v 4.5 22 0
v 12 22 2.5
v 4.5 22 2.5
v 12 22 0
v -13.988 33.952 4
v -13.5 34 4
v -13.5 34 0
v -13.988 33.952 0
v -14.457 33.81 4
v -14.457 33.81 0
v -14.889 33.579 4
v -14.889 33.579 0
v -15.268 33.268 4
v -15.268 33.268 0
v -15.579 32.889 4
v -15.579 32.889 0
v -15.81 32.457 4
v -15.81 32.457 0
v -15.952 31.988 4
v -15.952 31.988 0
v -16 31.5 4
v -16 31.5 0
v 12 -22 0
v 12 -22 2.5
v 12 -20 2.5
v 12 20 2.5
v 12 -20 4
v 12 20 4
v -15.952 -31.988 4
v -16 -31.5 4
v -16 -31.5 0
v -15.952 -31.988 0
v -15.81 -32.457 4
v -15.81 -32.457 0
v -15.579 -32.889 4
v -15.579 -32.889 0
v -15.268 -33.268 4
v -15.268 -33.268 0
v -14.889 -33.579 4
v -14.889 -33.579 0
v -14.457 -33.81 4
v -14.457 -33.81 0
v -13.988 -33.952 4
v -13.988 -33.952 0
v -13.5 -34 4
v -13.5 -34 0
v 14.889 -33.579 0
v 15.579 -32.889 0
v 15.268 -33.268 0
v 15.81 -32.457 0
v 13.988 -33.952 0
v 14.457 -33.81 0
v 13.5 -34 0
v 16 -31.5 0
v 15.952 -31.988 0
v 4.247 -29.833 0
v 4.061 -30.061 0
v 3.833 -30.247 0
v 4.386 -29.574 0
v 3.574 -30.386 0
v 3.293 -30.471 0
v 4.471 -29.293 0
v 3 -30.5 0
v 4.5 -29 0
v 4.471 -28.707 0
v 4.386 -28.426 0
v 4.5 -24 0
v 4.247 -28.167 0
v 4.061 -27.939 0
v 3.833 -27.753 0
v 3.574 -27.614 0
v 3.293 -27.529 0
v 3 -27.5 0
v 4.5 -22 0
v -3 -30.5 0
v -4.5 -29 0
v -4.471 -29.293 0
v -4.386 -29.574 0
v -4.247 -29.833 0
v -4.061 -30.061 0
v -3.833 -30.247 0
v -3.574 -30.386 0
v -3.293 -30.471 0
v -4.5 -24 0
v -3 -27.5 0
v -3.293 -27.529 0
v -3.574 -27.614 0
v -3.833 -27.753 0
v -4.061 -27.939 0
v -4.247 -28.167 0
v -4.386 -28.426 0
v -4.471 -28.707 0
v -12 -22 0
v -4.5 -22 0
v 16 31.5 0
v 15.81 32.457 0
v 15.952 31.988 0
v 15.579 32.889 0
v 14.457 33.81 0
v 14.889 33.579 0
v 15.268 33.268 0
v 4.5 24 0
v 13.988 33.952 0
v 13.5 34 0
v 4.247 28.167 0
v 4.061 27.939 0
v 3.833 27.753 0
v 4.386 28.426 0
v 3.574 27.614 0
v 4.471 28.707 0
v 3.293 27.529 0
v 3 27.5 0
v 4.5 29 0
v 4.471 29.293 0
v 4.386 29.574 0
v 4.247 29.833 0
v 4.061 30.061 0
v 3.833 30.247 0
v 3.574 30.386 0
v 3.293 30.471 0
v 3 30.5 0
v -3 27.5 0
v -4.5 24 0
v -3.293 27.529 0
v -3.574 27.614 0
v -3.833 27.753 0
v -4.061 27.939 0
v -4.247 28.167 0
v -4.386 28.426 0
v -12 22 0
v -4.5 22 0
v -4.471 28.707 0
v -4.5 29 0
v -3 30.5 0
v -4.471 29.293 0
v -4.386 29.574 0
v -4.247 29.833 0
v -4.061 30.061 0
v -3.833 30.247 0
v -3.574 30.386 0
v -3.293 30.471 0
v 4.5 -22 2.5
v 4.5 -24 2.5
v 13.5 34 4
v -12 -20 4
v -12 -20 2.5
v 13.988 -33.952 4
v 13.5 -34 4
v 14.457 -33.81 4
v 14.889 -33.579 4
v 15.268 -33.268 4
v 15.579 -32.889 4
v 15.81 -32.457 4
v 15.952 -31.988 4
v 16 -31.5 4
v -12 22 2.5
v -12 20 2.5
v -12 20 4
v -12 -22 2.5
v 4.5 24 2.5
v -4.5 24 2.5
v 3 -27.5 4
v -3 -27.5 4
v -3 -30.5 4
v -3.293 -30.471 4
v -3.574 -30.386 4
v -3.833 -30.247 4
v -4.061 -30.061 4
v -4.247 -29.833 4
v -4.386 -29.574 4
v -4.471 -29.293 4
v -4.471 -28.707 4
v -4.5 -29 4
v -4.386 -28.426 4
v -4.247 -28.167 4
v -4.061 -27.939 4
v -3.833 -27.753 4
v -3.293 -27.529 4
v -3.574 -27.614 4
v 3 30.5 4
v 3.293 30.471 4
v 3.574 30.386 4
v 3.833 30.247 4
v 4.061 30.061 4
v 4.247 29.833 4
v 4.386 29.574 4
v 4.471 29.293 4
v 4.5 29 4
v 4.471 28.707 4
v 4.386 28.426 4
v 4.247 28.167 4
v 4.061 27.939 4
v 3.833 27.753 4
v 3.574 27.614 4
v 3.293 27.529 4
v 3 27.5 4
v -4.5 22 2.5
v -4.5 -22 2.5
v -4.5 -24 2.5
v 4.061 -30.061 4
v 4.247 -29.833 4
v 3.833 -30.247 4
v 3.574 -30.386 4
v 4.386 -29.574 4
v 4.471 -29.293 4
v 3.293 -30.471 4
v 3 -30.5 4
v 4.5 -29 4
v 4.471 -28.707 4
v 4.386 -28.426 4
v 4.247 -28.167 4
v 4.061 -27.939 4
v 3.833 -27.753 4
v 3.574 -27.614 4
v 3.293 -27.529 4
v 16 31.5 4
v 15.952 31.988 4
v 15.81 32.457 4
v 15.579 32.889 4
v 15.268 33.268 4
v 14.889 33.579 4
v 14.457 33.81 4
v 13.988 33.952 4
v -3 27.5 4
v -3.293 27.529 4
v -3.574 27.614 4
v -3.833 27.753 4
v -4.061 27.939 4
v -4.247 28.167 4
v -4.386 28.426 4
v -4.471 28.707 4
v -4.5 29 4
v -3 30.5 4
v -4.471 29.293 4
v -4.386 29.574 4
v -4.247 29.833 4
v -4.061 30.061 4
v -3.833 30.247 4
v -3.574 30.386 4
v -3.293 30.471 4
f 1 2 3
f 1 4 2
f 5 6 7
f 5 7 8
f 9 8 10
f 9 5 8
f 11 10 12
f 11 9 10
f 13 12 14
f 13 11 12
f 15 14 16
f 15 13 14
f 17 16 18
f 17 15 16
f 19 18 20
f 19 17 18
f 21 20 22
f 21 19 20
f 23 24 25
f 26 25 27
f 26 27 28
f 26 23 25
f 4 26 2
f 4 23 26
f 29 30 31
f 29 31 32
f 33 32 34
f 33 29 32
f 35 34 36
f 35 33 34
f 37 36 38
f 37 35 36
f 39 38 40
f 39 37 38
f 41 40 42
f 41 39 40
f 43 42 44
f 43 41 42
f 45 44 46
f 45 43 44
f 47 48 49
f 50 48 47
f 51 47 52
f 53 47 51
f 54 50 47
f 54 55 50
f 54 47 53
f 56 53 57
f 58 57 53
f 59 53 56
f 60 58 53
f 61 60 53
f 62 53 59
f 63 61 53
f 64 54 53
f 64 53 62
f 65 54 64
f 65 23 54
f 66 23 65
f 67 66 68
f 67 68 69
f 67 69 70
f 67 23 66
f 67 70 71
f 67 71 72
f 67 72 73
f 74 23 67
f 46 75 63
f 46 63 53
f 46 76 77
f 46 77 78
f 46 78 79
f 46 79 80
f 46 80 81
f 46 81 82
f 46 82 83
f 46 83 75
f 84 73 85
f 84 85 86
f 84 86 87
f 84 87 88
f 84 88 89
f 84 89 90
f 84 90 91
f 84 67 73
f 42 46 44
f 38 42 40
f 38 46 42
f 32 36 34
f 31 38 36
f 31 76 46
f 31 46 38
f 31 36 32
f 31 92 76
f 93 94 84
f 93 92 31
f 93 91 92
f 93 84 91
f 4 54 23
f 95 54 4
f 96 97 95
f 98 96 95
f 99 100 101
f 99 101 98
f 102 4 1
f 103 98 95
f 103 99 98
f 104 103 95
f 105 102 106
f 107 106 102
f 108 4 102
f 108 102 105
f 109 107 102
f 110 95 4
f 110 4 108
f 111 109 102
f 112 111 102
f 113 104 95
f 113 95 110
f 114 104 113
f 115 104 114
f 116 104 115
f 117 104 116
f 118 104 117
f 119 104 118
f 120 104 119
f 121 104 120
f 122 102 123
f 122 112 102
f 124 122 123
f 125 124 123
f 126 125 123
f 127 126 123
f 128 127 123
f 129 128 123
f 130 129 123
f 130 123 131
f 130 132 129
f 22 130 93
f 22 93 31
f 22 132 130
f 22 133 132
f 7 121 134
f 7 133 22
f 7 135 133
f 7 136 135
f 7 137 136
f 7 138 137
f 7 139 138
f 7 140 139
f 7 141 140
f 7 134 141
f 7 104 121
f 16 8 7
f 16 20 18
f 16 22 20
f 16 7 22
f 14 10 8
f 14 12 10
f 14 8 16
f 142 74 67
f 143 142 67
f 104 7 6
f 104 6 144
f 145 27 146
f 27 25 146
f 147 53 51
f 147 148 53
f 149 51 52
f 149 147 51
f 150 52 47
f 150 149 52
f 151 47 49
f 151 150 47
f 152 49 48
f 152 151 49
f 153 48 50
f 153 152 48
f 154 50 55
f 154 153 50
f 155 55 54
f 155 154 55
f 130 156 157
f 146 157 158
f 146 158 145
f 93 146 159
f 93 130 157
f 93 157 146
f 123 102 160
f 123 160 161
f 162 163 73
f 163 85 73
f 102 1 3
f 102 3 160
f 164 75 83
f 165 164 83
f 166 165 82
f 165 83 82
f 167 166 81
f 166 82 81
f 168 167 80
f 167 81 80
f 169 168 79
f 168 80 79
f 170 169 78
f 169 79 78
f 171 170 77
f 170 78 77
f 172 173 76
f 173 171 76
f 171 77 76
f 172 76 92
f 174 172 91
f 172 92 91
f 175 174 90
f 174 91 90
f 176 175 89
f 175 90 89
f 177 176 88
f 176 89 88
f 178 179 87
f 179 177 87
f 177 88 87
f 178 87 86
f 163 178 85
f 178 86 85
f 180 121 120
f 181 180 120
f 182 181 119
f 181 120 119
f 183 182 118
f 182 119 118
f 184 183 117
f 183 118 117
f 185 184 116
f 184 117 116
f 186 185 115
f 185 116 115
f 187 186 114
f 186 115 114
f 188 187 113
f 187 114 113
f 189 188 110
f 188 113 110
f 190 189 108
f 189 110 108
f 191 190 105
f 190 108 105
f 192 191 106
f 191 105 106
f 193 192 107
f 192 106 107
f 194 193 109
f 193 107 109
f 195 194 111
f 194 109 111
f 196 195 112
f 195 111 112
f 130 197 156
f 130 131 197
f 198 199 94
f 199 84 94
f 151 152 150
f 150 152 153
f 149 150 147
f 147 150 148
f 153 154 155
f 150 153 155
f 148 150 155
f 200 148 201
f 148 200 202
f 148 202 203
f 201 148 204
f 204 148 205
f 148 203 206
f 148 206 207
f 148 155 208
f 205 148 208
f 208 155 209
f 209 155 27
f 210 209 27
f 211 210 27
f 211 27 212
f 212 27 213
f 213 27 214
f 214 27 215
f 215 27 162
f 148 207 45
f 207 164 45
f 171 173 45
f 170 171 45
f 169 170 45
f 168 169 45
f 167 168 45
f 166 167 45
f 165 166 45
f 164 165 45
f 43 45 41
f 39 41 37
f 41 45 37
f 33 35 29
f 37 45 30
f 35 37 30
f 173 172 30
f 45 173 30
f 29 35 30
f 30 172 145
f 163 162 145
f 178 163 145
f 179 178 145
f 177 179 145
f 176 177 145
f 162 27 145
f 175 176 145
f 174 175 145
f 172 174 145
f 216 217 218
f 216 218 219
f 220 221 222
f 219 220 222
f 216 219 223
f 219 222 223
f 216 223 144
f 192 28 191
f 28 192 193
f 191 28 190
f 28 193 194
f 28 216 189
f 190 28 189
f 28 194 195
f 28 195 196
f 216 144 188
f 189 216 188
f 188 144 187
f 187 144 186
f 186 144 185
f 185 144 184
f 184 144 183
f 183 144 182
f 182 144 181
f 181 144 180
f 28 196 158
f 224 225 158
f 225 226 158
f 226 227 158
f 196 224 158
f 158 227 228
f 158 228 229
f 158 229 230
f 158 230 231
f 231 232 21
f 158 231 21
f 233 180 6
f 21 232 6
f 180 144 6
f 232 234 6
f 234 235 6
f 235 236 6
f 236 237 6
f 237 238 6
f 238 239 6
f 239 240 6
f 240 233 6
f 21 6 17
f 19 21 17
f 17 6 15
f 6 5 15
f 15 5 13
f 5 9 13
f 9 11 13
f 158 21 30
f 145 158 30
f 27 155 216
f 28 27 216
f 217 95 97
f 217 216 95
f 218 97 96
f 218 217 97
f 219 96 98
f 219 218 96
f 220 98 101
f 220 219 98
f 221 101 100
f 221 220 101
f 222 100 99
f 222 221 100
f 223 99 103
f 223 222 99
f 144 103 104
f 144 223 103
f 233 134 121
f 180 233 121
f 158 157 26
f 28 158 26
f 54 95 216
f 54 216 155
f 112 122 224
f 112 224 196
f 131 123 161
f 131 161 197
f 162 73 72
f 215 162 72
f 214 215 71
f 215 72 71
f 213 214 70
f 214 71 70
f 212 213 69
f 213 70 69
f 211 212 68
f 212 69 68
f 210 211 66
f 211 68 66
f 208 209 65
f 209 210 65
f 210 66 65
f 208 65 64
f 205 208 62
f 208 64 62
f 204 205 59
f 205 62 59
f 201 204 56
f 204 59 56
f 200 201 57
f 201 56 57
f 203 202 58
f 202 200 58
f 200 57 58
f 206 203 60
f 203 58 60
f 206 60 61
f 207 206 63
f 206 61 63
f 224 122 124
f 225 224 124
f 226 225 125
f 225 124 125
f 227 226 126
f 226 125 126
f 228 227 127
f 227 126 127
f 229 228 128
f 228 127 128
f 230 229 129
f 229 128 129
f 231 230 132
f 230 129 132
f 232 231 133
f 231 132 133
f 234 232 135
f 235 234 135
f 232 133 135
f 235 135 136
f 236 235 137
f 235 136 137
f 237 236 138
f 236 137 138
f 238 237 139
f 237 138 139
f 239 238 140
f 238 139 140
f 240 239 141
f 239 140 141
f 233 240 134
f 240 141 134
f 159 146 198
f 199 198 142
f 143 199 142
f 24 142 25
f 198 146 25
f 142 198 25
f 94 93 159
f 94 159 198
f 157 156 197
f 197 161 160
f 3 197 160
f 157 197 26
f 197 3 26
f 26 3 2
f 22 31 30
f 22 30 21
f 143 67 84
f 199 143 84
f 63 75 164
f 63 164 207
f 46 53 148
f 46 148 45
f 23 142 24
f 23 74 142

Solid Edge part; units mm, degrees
sketch "Sketch1" plane through (0, 0, 0) normal (0, 0, 1) x (1, 0, 0)
  line L0 (-16, 34) -> (16, 34)
  line L1 (16, 34) -> (16, -34)
  line L2 (16, -34) -> (-16, -34)
  line L3 (-16, -34) -> (-16, 34)
  line L4 (-3, 27.5) -> (3, 27.5)
  line L5 (-3, 30.5) -> (3, 30.5)
  arc A0 (3, 30.5) -> (3, 27.5) centre (3, 29) cw
  arc A1 (-3, 27.5) -> (-3, 30.5) centre (-3, 29) cw
  arc A2 (3, -30.5) -> (3, -27.5) centre (3, -29) ccw
  line L6 (-3, -27.5) -> (3, -27.5)
  arc A3 (-3, -27.5) -> (-3, -30.5) centre (-3, -29) ccw
  line L7 (-3, -30.5) -> (3, -30.5)
  line L8 (-12, 20) -> (12, 20)
  line L9 (12, -20) -> (12, 20)
  line L10 (12, -20) -> (-12, -20)
  line L11 (-12, 20) -> (-12, -20)
extrude "Protrusion1" add sketch "Sketch1" along normal blind 4
sketch "Sketch2" plane through (0, 0, 0) normal (0, 0, 1) x (1, 0, 0)
  line L0 (4.5, 24) -> (-4.5, 24)
  line L1 (-4.5, 24) -> (-4.5, 20)
  line L2 (-4.5, 20) -> (4.5, 20)
  line L3 (4.5, 20) -> (4.5, 24)
extrude "ExtrudedCutout_3" cut sketch "Sketch2" along normal blind 2.5
fillet "Round_2" radius 2.5 4 edges at (16, 34, 2) (-16, 34, 2) (-16, -34, 2) (16, -34, 2)
sketch "Sketch3" plane through (0, 0, 0) normal (0, 0, 1) x (1, 0, 0)
  line L0 (4.5, -24) -> (-4.5, -24)
  line L1 (-4.5, -24) -> (-4.5, -20)
  line L2 (-4.5, -20) -> (4.5, -20)
  line L3 (4.5, -20) -> (4.5, -24)
extrude "Cutout1" cut sketch "Sketch3" along normal up to vertex (2.5 mm away)
sketch "Sketch4" plane through (0, 0, 0) normal (0, 0, -1) x (-1, 0, 0)
  line L0 (4.5, 22) -> (12, 22)
  line L1 (12, 22) -> (12, 20)
  line L2 (12, 20) -> (4.5, 20)
  line L3 (4.5, 20) -> (4.5, 22)
  line L4 (-12, 22) -> (-4.5, 22)
  line L5 (-4.5, 22) -> (-4.5, 20)
  line L6 (-4.5, 20) -> (-12, 20)
  line L7 (-12, 20) -> (-12, 22)
  line L8 (12, -22) -> (4.5, -22)
  line L9 (4.5, -22) -> (4.5, -20)
  line L10 (4.5, -20) -> (12, -20)
  line L11 (12, -20) -> (12, -22)
  line L12 (-12, -20) -> (-4.5, -20)
  line L13 (-4.5, -20) -> (-4.5, -22)
  line L14 (-4.5, -22) -> (-12, -22)
  line L15 (-12, -22) -> (-12, -20)
extrude "Cutout2" cut sketch "Sketch4" against normal up to vertex (2.5 mm away)
